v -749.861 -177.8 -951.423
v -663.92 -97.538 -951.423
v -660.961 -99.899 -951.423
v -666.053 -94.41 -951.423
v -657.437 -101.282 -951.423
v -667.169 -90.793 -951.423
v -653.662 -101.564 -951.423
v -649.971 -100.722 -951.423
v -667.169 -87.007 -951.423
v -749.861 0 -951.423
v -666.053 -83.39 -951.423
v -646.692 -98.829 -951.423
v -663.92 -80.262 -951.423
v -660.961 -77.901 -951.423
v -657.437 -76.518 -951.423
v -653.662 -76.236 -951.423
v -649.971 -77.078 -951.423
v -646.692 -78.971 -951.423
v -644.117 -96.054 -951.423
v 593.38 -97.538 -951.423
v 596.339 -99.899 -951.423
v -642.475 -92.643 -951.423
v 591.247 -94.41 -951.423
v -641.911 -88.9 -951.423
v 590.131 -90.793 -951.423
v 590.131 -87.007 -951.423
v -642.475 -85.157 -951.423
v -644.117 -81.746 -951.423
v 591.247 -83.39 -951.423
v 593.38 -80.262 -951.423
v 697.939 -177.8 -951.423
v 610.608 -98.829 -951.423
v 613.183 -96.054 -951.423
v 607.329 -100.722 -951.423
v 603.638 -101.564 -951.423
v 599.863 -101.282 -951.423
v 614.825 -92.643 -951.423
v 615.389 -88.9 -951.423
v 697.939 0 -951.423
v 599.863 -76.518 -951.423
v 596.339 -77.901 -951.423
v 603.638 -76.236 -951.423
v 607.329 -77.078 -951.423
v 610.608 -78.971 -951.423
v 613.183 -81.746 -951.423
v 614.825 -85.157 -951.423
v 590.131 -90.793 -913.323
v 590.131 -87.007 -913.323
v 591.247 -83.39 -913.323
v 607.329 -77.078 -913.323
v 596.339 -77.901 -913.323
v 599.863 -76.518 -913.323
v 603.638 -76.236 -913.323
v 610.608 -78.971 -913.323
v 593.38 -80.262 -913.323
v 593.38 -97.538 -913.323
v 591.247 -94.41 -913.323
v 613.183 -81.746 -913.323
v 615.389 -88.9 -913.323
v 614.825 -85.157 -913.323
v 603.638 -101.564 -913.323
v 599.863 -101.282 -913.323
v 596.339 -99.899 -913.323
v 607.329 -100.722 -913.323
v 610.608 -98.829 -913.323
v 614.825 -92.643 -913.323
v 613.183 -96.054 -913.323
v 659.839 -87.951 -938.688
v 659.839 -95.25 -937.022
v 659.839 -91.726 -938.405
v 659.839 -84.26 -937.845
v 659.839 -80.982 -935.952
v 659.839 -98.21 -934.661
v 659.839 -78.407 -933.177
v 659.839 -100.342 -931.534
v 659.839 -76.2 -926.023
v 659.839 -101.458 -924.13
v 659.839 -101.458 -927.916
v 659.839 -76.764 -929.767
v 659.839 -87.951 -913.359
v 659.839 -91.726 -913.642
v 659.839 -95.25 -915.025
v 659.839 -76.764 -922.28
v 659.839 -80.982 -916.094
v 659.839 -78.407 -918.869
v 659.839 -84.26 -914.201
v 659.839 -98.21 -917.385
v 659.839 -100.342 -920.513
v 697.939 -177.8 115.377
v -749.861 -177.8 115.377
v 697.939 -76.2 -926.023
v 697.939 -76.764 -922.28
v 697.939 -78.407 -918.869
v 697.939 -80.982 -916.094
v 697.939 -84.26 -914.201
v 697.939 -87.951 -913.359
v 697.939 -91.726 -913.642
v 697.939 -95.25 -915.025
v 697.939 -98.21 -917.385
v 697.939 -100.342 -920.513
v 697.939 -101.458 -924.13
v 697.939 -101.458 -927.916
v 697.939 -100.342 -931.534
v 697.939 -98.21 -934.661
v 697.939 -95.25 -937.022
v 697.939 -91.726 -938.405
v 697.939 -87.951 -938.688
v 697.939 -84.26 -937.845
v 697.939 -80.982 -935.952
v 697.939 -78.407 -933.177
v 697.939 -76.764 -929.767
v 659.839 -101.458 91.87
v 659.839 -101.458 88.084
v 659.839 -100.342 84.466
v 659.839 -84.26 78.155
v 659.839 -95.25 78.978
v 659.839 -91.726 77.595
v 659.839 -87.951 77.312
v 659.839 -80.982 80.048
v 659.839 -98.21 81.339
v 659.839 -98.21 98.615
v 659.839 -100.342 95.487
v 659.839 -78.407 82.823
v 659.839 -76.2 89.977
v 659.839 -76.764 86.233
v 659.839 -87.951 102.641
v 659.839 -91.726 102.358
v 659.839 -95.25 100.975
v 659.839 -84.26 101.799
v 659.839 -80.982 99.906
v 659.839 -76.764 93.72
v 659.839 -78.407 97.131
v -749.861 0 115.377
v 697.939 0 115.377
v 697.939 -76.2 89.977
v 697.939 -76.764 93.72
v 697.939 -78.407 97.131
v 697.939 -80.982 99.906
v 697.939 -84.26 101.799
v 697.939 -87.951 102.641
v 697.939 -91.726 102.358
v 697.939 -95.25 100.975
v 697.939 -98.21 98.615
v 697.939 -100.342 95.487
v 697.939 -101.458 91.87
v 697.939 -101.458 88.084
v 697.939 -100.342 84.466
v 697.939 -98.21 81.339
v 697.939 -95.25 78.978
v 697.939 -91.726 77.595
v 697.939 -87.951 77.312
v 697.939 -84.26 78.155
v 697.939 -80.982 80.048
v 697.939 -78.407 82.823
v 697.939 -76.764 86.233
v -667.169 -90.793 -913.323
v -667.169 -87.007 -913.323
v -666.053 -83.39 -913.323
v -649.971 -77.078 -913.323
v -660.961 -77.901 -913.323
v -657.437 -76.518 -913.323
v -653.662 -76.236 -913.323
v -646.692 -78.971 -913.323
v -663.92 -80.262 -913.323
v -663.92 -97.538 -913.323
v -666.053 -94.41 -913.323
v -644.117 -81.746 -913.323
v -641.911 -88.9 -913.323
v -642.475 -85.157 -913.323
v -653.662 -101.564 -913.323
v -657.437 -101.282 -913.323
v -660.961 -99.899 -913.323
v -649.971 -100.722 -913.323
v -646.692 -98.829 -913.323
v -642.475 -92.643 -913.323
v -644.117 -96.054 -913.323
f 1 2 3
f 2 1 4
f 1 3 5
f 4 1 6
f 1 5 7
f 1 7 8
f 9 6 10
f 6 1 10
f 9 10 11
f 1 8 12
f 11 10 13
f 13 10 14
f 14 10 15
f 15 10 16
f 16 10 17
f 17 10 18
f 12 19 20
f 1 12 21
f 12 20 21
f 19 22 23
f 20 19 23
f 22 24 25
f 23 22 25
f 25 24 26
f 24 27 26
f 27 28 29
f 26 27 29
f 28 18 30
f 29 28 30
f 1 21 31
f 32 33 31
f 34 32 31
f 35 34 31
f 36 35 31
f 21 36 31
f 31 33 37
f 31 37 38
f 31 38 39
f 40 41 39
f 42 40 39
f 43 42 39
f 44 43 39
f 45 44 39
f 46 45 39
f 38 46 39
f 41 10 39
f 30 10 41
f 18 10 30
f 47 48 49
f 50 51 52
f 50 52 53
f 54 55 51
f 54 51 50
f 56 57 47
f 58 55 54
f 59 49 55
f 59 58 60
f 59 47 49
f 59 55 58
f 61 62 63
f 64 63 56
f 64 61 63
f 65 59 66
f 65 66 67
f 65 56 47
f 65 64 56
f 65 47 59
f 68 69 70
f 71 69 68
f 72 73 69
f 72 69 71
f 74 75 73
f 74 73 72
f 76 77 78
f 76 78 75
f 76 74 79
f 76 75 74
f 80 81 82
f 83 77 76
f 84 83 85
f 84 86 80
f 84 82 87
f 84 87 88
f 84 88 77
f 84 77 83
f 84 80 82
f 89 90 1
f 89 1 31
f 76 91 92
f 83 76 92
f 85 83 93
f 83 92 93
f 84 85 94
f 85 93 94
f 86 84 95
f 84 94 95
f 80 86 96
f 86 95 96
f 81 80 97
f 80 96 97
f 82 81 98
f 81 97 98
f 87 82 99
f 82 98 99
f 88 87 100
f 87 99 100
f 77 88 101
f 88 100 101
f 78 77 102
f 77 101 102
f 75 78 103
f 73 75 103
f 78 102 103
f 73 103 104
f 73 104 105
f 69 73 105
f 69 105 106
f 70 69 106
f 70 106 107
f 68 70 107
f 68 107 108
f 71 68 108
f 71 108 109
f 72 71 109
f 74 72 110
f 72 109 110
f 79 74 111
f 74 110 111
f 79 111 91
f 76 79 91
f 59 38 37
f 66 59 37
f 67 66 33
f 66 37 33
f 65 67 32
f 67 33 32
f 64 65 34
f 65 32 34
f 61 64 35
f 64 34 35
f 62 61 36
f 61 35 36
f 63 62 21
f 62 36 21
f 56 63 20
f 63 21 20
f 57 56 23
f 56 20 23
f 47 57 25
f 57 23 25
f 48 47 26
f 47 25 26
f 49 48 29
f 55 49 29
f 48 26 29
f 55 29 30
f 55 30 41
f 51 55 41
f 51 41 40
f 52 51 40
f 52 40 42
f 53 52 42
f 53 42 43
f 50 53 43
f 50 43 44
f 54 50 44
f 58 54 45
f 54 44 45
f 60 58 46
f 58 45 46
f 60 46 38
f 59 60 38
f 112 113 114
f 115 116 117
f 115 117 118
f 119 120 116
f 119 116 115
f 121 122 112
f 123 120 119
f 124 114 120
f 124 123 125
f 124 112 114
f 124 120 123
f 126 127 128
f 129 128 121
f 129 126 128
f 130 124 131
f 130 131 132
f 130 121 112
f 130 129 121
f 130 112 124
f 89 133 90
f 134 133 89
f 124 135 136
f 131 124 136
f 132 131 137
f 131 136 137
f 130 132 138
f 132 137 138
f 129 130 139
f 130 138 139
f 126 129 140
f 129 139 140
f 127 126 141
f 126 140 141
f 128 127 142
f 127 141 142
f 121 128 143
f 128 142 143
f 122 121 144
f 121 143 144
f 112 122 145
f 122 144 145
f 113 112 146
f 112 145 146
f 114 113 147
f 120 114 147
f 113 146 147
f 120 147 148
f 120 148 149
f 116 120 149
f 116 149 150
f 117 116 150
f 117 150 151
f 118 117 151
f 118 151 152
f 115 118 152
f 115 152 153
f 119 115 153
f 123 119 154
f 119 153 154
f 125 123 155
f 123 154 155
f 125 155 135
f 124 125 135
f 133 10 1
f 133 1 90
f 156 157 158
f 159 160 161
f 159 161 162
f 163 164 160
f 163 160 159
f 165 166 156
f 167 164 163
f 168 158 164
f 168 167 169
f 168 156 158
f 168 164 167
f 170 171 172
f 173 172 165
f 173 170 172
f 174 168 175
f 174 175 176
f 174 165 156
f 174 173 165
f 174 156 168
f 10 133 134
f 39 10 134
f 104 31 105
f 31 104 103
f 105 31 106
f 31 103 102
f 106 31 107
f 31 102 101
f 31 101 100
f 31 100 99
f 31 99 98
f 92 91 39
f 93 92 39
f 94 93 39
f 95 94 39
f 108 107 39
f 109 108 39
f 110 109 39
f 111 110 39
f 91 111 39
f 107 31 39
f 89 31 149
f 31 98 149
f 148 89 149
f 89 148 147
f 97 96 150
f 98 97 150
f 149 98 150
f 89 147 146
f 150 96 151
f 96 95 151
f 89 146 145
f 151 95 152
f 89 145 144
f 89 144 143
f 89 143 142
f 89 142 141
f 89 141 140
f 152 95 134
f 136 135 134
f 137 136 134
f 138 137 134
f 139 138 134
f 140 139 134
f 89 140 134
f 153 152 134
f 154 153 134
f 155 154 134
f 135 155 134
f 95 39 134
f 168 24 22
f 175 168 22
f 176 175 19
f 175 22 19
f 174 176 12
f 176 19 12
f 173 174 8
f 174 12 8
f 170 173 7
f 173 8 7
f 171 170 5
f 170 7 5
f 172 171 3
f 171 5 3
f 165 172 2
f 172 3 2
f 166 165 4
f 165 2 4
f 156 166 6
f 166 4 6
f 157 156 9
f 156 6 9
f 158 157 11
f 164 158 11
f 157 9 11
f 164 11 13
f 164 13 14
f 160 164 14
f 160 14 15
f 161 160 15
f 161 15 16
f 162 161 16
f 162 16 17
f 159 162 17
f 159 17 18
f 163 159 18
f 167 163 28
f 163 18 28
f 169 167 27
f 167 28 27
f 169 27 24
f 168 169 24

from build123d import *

# Parameters (mm, degrees)
F0_W     = 1447.8
F0_H     = 1066.8
F1_DEPTH = 177.8
F2_R     = 12.7
F3_DEPTH = 38.1
F4_R     = 12.7
F5_DEPTH = 38.1


with BuildPart() as f1:
    # F0 (on Front) → F1 (new body)
    with BuildSketch(Plane.XZ):
        with Locations((-25.960692, -418.023234)):
            Rectangle(F0_W, F0_H)
    extrude(amount=F1_DEPTH)

    # F2 (on face) → F3 (cut)
    with BuildSketch(Plane(origin=(0, 0, -951.423234), x_dir=(1, 0, 0), z_dir=(0, 0, -1))):
        with Locations((-654.610692, 88.9)):
            Circle(F2_R)
        with Locations((602.689308, 88.9)):
            Circle(F2_R)
    extrude(amount=-F3_DEPTH, mode=Mode.SUBTRACT)

    # F4 (on face) → F5 (cut)
    with BuildSketch(Plane.YZ.offset(697.939308)):
        with Locations((-88.9, 89.976766)):
            Circle(F4_R)
        with Locations((-88.9, -926.023234)):
            Circle(F4_R)
    extrude(amount=-F5_DEPTH, mode=Mode.SUBTRACT)


solid = f1.part
